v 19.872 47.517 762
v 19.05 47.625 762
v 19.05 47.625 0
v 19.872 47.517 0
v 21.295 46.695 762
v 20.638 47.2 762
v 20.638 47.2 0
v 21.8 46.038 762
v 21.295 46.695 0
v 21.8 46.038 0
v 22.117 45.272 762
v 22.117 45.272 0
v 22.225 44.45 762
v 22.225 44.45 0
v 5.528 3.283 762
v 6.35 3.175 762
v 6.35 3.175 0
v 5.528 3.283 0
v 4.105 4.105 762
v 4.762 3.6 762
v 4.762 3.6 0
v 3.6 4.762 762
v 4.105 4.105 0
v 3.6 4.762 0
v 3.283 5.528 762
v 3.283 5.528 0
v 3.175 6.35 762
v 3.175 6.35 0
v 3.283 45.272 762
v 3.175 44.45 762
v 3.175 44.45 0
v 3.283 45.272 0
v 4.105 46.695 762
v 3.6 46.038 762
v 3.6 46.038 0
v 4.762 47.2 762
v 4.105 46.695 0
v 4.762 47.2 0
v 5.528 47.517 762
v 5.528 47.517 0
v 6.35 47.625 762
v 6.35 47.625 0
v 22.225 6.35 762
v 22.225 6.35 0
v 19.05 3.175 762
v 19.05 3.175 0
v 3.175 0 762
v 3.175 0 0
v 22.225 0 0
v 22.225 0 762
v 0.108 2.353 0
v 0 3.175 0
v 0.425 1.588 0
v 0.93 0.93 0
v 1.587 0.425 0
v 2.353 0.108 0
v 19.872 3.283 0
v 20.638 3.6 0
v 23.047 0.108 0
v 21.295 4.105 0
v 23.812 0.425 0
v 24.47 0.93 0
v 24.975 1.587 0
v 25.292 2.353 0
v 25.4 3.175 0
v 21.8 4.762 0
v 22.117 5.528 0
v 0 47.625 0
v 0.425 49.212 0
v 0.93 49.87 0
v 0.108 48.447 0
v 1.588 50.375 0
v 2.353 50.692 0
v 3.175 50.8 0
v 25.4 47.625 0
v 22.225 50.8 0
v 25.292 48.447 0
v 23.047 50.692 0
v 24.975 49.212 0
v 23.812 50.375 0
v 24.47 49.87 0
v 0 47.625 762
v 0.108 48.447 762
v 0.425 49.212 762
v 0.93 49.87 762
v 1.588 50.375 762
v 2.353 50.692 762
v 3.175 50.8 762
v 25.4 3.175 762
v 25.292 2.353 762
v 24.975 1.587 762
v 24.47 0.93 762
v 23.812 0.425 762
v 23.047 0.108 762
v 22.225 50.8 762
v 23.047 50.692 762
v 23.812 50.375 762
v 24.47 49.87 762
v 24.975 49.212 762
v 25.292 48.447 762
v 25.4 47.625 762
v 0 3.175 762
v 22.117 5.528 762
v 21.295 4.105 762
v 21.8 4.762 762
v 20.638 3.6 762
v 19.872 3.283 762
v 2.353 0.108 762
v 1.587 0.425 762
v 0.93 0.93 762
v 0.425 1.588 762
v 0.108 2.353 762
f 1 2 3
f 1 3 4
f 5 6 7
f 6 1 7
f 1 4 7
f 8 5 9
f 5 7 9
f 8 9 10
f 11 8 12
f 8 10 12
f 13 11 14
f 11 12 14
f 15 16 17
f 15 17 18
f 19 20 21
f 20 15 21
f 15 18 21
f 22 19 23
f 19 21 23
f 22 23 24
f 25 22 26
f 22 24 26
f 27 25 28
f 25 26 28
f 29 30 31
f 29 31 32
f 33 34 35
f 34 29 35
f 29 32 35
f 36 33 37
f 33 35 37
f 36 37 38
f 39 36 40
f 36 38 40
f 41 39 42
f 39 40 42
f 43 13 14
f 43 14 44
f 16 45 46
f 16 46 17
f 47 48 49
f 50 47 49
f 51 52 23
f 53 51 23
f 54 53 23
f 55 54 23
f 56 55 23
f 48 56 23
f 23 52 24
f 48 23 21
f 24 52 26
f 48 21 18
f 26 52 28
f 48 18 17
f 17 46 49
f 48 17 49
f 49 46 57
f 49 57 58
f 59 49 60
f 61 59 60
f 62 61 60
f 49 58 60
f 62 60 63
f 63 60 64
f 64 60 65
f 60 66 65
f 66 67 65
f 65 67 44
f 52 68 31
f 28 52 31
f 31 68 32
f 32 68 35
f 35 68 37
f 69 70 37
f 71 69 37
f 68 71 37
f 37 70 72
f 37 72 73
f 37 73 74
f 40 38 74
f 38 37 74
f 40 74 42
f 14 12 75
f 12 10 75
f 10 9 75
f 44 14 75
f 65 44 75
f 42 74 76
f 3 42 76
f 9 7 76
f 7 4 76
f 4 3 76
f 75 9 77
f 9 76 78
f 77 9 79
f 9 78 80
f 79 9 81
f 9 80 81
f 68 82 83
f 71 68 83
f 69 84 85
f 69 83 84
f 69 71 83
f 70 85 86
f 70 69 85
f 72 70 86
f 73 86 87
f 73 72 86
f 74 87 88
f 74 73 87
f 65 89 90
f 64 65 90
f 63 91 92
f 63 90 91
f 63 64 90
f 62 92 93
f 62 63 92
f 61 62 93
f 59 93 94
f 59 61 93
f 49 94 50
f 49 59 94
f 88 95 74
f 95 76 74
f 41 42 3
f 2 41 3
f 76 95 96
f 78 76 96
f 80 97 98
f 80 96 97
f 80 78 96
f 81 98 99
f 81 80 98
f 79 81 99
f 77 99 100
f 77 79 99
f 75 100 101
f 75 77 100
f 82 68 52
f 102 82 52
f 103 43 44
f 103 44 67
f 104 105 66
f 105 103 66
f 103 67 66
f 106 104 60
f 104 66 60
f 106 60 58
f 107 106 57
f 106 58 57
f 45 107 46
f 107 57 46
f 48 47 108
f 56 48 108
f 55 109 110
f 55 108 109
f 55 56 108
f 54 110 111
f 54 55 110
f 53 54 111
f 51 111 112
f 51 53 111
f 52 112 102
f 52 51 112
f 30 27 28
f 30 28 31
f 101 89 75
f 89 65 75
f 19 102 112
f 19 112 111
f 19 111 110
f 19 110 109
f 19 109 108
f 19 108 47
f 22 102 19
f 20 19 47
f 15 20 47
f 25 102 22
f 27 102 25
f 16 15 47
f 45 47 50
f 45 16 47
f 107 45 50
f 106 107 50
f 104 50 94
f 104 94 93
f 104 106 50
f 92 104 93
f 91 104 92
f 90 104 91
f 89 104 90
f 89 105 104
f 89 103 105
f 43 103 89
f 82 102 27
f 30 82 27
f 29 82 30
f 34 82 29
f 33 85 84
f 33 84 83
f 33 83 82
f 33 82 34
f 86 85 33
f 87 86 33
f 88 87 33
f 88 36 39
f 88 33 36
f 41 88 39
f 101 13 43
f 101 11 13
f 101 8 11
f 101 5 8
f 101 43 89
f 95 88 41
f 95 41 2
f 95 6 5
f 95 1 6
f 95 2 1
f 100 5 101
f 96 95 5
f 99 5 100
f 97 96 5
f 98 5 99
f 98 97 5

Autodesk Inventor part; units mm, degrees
ref_plane "YZ Plane" through (0, 0, 0) normal (1, 0, 0) x (0, 1, 0)
ref_plane "XZ Plane" through (0, 0, 0) normal (0, 1, 0) x (-1, 0, 0)
ref_plane "XY Plane" through (0, 0, 0) normal (0, 0, 1) x (1, 0, 0)
sketch "Sketch1" plane through (0, 0, 0) normal (0, 0, 1) x (1, 0, 0)
  line L0 (3.175, 0) -> (22.225, 0)
  line L1 (25.4, 3.175) -> (25.4, 47.625)
  line L2 (22.225, 50.8) -> (3.175, 50.8)
  line L3 (0, 47.625) -> (0, 3.175)
  arc A0 (3.175, 50.8) -> (0, 47.625) centre (3.175, 47.625) ccw
  arc A1 (25.4, 47.625) -> (22.225, 50.8) centre (22.225, 47.625) ccw
  arc A2 (22.225, 0) -> (25.4, 3.175) centre (22.225, 3.175) ccw
  arc A3 (0, 3.175) -> (3.175, 0) centre (3.175, 3.175) ccw
  line L4 (6.35, 47.625) -> (19.05, 47.625)
  line L5 (22.225, 44.45) -> (22.225, 6.35)
  line L6 (19.05, 3.175) -> (6.35, 3.175)
  line L7 (3.175, 6.35) -> (3.175, 44.45)
  arc A4 (6.35, 47.625) -> (3.175, 44.45) centre (6.35, 44.45) ccw
  arc A5 (22.225, 44.45) -> (19.05, 47.625) centre (19.05, 44.45) ccw
  arc A6 (3.175, 6.35) -> (6.35, 3.175) centre (6.35, 6.35) ccw
  arc A7 (19.05, 3.175) -> (22.225, 6.35) centre (19.05, 6.35) ccw
  point P0 (0, 0)
  point P1 (25.4, 0)
  point P2 (0, 50.8)
  dimension "d0" = 50.8
  dimension "d1" = 25.4
  dimension "d2" = 3.175
  dimension "d3" = 3.175
  dimension "d4" = 3.175
  dimension "d5" = 3.175
  dimension "d6" = 3.175
  dimension "d7" = 3.175
  dimension "d8" = 3.175
  dimension "d9" = 3.175
  dimension "d10" = 3.175
extrude "Extrusion1" add sketch "Sketch1" along normal blind 762
properties part number "O channel 30 inch" material "Steel, Alloy"
